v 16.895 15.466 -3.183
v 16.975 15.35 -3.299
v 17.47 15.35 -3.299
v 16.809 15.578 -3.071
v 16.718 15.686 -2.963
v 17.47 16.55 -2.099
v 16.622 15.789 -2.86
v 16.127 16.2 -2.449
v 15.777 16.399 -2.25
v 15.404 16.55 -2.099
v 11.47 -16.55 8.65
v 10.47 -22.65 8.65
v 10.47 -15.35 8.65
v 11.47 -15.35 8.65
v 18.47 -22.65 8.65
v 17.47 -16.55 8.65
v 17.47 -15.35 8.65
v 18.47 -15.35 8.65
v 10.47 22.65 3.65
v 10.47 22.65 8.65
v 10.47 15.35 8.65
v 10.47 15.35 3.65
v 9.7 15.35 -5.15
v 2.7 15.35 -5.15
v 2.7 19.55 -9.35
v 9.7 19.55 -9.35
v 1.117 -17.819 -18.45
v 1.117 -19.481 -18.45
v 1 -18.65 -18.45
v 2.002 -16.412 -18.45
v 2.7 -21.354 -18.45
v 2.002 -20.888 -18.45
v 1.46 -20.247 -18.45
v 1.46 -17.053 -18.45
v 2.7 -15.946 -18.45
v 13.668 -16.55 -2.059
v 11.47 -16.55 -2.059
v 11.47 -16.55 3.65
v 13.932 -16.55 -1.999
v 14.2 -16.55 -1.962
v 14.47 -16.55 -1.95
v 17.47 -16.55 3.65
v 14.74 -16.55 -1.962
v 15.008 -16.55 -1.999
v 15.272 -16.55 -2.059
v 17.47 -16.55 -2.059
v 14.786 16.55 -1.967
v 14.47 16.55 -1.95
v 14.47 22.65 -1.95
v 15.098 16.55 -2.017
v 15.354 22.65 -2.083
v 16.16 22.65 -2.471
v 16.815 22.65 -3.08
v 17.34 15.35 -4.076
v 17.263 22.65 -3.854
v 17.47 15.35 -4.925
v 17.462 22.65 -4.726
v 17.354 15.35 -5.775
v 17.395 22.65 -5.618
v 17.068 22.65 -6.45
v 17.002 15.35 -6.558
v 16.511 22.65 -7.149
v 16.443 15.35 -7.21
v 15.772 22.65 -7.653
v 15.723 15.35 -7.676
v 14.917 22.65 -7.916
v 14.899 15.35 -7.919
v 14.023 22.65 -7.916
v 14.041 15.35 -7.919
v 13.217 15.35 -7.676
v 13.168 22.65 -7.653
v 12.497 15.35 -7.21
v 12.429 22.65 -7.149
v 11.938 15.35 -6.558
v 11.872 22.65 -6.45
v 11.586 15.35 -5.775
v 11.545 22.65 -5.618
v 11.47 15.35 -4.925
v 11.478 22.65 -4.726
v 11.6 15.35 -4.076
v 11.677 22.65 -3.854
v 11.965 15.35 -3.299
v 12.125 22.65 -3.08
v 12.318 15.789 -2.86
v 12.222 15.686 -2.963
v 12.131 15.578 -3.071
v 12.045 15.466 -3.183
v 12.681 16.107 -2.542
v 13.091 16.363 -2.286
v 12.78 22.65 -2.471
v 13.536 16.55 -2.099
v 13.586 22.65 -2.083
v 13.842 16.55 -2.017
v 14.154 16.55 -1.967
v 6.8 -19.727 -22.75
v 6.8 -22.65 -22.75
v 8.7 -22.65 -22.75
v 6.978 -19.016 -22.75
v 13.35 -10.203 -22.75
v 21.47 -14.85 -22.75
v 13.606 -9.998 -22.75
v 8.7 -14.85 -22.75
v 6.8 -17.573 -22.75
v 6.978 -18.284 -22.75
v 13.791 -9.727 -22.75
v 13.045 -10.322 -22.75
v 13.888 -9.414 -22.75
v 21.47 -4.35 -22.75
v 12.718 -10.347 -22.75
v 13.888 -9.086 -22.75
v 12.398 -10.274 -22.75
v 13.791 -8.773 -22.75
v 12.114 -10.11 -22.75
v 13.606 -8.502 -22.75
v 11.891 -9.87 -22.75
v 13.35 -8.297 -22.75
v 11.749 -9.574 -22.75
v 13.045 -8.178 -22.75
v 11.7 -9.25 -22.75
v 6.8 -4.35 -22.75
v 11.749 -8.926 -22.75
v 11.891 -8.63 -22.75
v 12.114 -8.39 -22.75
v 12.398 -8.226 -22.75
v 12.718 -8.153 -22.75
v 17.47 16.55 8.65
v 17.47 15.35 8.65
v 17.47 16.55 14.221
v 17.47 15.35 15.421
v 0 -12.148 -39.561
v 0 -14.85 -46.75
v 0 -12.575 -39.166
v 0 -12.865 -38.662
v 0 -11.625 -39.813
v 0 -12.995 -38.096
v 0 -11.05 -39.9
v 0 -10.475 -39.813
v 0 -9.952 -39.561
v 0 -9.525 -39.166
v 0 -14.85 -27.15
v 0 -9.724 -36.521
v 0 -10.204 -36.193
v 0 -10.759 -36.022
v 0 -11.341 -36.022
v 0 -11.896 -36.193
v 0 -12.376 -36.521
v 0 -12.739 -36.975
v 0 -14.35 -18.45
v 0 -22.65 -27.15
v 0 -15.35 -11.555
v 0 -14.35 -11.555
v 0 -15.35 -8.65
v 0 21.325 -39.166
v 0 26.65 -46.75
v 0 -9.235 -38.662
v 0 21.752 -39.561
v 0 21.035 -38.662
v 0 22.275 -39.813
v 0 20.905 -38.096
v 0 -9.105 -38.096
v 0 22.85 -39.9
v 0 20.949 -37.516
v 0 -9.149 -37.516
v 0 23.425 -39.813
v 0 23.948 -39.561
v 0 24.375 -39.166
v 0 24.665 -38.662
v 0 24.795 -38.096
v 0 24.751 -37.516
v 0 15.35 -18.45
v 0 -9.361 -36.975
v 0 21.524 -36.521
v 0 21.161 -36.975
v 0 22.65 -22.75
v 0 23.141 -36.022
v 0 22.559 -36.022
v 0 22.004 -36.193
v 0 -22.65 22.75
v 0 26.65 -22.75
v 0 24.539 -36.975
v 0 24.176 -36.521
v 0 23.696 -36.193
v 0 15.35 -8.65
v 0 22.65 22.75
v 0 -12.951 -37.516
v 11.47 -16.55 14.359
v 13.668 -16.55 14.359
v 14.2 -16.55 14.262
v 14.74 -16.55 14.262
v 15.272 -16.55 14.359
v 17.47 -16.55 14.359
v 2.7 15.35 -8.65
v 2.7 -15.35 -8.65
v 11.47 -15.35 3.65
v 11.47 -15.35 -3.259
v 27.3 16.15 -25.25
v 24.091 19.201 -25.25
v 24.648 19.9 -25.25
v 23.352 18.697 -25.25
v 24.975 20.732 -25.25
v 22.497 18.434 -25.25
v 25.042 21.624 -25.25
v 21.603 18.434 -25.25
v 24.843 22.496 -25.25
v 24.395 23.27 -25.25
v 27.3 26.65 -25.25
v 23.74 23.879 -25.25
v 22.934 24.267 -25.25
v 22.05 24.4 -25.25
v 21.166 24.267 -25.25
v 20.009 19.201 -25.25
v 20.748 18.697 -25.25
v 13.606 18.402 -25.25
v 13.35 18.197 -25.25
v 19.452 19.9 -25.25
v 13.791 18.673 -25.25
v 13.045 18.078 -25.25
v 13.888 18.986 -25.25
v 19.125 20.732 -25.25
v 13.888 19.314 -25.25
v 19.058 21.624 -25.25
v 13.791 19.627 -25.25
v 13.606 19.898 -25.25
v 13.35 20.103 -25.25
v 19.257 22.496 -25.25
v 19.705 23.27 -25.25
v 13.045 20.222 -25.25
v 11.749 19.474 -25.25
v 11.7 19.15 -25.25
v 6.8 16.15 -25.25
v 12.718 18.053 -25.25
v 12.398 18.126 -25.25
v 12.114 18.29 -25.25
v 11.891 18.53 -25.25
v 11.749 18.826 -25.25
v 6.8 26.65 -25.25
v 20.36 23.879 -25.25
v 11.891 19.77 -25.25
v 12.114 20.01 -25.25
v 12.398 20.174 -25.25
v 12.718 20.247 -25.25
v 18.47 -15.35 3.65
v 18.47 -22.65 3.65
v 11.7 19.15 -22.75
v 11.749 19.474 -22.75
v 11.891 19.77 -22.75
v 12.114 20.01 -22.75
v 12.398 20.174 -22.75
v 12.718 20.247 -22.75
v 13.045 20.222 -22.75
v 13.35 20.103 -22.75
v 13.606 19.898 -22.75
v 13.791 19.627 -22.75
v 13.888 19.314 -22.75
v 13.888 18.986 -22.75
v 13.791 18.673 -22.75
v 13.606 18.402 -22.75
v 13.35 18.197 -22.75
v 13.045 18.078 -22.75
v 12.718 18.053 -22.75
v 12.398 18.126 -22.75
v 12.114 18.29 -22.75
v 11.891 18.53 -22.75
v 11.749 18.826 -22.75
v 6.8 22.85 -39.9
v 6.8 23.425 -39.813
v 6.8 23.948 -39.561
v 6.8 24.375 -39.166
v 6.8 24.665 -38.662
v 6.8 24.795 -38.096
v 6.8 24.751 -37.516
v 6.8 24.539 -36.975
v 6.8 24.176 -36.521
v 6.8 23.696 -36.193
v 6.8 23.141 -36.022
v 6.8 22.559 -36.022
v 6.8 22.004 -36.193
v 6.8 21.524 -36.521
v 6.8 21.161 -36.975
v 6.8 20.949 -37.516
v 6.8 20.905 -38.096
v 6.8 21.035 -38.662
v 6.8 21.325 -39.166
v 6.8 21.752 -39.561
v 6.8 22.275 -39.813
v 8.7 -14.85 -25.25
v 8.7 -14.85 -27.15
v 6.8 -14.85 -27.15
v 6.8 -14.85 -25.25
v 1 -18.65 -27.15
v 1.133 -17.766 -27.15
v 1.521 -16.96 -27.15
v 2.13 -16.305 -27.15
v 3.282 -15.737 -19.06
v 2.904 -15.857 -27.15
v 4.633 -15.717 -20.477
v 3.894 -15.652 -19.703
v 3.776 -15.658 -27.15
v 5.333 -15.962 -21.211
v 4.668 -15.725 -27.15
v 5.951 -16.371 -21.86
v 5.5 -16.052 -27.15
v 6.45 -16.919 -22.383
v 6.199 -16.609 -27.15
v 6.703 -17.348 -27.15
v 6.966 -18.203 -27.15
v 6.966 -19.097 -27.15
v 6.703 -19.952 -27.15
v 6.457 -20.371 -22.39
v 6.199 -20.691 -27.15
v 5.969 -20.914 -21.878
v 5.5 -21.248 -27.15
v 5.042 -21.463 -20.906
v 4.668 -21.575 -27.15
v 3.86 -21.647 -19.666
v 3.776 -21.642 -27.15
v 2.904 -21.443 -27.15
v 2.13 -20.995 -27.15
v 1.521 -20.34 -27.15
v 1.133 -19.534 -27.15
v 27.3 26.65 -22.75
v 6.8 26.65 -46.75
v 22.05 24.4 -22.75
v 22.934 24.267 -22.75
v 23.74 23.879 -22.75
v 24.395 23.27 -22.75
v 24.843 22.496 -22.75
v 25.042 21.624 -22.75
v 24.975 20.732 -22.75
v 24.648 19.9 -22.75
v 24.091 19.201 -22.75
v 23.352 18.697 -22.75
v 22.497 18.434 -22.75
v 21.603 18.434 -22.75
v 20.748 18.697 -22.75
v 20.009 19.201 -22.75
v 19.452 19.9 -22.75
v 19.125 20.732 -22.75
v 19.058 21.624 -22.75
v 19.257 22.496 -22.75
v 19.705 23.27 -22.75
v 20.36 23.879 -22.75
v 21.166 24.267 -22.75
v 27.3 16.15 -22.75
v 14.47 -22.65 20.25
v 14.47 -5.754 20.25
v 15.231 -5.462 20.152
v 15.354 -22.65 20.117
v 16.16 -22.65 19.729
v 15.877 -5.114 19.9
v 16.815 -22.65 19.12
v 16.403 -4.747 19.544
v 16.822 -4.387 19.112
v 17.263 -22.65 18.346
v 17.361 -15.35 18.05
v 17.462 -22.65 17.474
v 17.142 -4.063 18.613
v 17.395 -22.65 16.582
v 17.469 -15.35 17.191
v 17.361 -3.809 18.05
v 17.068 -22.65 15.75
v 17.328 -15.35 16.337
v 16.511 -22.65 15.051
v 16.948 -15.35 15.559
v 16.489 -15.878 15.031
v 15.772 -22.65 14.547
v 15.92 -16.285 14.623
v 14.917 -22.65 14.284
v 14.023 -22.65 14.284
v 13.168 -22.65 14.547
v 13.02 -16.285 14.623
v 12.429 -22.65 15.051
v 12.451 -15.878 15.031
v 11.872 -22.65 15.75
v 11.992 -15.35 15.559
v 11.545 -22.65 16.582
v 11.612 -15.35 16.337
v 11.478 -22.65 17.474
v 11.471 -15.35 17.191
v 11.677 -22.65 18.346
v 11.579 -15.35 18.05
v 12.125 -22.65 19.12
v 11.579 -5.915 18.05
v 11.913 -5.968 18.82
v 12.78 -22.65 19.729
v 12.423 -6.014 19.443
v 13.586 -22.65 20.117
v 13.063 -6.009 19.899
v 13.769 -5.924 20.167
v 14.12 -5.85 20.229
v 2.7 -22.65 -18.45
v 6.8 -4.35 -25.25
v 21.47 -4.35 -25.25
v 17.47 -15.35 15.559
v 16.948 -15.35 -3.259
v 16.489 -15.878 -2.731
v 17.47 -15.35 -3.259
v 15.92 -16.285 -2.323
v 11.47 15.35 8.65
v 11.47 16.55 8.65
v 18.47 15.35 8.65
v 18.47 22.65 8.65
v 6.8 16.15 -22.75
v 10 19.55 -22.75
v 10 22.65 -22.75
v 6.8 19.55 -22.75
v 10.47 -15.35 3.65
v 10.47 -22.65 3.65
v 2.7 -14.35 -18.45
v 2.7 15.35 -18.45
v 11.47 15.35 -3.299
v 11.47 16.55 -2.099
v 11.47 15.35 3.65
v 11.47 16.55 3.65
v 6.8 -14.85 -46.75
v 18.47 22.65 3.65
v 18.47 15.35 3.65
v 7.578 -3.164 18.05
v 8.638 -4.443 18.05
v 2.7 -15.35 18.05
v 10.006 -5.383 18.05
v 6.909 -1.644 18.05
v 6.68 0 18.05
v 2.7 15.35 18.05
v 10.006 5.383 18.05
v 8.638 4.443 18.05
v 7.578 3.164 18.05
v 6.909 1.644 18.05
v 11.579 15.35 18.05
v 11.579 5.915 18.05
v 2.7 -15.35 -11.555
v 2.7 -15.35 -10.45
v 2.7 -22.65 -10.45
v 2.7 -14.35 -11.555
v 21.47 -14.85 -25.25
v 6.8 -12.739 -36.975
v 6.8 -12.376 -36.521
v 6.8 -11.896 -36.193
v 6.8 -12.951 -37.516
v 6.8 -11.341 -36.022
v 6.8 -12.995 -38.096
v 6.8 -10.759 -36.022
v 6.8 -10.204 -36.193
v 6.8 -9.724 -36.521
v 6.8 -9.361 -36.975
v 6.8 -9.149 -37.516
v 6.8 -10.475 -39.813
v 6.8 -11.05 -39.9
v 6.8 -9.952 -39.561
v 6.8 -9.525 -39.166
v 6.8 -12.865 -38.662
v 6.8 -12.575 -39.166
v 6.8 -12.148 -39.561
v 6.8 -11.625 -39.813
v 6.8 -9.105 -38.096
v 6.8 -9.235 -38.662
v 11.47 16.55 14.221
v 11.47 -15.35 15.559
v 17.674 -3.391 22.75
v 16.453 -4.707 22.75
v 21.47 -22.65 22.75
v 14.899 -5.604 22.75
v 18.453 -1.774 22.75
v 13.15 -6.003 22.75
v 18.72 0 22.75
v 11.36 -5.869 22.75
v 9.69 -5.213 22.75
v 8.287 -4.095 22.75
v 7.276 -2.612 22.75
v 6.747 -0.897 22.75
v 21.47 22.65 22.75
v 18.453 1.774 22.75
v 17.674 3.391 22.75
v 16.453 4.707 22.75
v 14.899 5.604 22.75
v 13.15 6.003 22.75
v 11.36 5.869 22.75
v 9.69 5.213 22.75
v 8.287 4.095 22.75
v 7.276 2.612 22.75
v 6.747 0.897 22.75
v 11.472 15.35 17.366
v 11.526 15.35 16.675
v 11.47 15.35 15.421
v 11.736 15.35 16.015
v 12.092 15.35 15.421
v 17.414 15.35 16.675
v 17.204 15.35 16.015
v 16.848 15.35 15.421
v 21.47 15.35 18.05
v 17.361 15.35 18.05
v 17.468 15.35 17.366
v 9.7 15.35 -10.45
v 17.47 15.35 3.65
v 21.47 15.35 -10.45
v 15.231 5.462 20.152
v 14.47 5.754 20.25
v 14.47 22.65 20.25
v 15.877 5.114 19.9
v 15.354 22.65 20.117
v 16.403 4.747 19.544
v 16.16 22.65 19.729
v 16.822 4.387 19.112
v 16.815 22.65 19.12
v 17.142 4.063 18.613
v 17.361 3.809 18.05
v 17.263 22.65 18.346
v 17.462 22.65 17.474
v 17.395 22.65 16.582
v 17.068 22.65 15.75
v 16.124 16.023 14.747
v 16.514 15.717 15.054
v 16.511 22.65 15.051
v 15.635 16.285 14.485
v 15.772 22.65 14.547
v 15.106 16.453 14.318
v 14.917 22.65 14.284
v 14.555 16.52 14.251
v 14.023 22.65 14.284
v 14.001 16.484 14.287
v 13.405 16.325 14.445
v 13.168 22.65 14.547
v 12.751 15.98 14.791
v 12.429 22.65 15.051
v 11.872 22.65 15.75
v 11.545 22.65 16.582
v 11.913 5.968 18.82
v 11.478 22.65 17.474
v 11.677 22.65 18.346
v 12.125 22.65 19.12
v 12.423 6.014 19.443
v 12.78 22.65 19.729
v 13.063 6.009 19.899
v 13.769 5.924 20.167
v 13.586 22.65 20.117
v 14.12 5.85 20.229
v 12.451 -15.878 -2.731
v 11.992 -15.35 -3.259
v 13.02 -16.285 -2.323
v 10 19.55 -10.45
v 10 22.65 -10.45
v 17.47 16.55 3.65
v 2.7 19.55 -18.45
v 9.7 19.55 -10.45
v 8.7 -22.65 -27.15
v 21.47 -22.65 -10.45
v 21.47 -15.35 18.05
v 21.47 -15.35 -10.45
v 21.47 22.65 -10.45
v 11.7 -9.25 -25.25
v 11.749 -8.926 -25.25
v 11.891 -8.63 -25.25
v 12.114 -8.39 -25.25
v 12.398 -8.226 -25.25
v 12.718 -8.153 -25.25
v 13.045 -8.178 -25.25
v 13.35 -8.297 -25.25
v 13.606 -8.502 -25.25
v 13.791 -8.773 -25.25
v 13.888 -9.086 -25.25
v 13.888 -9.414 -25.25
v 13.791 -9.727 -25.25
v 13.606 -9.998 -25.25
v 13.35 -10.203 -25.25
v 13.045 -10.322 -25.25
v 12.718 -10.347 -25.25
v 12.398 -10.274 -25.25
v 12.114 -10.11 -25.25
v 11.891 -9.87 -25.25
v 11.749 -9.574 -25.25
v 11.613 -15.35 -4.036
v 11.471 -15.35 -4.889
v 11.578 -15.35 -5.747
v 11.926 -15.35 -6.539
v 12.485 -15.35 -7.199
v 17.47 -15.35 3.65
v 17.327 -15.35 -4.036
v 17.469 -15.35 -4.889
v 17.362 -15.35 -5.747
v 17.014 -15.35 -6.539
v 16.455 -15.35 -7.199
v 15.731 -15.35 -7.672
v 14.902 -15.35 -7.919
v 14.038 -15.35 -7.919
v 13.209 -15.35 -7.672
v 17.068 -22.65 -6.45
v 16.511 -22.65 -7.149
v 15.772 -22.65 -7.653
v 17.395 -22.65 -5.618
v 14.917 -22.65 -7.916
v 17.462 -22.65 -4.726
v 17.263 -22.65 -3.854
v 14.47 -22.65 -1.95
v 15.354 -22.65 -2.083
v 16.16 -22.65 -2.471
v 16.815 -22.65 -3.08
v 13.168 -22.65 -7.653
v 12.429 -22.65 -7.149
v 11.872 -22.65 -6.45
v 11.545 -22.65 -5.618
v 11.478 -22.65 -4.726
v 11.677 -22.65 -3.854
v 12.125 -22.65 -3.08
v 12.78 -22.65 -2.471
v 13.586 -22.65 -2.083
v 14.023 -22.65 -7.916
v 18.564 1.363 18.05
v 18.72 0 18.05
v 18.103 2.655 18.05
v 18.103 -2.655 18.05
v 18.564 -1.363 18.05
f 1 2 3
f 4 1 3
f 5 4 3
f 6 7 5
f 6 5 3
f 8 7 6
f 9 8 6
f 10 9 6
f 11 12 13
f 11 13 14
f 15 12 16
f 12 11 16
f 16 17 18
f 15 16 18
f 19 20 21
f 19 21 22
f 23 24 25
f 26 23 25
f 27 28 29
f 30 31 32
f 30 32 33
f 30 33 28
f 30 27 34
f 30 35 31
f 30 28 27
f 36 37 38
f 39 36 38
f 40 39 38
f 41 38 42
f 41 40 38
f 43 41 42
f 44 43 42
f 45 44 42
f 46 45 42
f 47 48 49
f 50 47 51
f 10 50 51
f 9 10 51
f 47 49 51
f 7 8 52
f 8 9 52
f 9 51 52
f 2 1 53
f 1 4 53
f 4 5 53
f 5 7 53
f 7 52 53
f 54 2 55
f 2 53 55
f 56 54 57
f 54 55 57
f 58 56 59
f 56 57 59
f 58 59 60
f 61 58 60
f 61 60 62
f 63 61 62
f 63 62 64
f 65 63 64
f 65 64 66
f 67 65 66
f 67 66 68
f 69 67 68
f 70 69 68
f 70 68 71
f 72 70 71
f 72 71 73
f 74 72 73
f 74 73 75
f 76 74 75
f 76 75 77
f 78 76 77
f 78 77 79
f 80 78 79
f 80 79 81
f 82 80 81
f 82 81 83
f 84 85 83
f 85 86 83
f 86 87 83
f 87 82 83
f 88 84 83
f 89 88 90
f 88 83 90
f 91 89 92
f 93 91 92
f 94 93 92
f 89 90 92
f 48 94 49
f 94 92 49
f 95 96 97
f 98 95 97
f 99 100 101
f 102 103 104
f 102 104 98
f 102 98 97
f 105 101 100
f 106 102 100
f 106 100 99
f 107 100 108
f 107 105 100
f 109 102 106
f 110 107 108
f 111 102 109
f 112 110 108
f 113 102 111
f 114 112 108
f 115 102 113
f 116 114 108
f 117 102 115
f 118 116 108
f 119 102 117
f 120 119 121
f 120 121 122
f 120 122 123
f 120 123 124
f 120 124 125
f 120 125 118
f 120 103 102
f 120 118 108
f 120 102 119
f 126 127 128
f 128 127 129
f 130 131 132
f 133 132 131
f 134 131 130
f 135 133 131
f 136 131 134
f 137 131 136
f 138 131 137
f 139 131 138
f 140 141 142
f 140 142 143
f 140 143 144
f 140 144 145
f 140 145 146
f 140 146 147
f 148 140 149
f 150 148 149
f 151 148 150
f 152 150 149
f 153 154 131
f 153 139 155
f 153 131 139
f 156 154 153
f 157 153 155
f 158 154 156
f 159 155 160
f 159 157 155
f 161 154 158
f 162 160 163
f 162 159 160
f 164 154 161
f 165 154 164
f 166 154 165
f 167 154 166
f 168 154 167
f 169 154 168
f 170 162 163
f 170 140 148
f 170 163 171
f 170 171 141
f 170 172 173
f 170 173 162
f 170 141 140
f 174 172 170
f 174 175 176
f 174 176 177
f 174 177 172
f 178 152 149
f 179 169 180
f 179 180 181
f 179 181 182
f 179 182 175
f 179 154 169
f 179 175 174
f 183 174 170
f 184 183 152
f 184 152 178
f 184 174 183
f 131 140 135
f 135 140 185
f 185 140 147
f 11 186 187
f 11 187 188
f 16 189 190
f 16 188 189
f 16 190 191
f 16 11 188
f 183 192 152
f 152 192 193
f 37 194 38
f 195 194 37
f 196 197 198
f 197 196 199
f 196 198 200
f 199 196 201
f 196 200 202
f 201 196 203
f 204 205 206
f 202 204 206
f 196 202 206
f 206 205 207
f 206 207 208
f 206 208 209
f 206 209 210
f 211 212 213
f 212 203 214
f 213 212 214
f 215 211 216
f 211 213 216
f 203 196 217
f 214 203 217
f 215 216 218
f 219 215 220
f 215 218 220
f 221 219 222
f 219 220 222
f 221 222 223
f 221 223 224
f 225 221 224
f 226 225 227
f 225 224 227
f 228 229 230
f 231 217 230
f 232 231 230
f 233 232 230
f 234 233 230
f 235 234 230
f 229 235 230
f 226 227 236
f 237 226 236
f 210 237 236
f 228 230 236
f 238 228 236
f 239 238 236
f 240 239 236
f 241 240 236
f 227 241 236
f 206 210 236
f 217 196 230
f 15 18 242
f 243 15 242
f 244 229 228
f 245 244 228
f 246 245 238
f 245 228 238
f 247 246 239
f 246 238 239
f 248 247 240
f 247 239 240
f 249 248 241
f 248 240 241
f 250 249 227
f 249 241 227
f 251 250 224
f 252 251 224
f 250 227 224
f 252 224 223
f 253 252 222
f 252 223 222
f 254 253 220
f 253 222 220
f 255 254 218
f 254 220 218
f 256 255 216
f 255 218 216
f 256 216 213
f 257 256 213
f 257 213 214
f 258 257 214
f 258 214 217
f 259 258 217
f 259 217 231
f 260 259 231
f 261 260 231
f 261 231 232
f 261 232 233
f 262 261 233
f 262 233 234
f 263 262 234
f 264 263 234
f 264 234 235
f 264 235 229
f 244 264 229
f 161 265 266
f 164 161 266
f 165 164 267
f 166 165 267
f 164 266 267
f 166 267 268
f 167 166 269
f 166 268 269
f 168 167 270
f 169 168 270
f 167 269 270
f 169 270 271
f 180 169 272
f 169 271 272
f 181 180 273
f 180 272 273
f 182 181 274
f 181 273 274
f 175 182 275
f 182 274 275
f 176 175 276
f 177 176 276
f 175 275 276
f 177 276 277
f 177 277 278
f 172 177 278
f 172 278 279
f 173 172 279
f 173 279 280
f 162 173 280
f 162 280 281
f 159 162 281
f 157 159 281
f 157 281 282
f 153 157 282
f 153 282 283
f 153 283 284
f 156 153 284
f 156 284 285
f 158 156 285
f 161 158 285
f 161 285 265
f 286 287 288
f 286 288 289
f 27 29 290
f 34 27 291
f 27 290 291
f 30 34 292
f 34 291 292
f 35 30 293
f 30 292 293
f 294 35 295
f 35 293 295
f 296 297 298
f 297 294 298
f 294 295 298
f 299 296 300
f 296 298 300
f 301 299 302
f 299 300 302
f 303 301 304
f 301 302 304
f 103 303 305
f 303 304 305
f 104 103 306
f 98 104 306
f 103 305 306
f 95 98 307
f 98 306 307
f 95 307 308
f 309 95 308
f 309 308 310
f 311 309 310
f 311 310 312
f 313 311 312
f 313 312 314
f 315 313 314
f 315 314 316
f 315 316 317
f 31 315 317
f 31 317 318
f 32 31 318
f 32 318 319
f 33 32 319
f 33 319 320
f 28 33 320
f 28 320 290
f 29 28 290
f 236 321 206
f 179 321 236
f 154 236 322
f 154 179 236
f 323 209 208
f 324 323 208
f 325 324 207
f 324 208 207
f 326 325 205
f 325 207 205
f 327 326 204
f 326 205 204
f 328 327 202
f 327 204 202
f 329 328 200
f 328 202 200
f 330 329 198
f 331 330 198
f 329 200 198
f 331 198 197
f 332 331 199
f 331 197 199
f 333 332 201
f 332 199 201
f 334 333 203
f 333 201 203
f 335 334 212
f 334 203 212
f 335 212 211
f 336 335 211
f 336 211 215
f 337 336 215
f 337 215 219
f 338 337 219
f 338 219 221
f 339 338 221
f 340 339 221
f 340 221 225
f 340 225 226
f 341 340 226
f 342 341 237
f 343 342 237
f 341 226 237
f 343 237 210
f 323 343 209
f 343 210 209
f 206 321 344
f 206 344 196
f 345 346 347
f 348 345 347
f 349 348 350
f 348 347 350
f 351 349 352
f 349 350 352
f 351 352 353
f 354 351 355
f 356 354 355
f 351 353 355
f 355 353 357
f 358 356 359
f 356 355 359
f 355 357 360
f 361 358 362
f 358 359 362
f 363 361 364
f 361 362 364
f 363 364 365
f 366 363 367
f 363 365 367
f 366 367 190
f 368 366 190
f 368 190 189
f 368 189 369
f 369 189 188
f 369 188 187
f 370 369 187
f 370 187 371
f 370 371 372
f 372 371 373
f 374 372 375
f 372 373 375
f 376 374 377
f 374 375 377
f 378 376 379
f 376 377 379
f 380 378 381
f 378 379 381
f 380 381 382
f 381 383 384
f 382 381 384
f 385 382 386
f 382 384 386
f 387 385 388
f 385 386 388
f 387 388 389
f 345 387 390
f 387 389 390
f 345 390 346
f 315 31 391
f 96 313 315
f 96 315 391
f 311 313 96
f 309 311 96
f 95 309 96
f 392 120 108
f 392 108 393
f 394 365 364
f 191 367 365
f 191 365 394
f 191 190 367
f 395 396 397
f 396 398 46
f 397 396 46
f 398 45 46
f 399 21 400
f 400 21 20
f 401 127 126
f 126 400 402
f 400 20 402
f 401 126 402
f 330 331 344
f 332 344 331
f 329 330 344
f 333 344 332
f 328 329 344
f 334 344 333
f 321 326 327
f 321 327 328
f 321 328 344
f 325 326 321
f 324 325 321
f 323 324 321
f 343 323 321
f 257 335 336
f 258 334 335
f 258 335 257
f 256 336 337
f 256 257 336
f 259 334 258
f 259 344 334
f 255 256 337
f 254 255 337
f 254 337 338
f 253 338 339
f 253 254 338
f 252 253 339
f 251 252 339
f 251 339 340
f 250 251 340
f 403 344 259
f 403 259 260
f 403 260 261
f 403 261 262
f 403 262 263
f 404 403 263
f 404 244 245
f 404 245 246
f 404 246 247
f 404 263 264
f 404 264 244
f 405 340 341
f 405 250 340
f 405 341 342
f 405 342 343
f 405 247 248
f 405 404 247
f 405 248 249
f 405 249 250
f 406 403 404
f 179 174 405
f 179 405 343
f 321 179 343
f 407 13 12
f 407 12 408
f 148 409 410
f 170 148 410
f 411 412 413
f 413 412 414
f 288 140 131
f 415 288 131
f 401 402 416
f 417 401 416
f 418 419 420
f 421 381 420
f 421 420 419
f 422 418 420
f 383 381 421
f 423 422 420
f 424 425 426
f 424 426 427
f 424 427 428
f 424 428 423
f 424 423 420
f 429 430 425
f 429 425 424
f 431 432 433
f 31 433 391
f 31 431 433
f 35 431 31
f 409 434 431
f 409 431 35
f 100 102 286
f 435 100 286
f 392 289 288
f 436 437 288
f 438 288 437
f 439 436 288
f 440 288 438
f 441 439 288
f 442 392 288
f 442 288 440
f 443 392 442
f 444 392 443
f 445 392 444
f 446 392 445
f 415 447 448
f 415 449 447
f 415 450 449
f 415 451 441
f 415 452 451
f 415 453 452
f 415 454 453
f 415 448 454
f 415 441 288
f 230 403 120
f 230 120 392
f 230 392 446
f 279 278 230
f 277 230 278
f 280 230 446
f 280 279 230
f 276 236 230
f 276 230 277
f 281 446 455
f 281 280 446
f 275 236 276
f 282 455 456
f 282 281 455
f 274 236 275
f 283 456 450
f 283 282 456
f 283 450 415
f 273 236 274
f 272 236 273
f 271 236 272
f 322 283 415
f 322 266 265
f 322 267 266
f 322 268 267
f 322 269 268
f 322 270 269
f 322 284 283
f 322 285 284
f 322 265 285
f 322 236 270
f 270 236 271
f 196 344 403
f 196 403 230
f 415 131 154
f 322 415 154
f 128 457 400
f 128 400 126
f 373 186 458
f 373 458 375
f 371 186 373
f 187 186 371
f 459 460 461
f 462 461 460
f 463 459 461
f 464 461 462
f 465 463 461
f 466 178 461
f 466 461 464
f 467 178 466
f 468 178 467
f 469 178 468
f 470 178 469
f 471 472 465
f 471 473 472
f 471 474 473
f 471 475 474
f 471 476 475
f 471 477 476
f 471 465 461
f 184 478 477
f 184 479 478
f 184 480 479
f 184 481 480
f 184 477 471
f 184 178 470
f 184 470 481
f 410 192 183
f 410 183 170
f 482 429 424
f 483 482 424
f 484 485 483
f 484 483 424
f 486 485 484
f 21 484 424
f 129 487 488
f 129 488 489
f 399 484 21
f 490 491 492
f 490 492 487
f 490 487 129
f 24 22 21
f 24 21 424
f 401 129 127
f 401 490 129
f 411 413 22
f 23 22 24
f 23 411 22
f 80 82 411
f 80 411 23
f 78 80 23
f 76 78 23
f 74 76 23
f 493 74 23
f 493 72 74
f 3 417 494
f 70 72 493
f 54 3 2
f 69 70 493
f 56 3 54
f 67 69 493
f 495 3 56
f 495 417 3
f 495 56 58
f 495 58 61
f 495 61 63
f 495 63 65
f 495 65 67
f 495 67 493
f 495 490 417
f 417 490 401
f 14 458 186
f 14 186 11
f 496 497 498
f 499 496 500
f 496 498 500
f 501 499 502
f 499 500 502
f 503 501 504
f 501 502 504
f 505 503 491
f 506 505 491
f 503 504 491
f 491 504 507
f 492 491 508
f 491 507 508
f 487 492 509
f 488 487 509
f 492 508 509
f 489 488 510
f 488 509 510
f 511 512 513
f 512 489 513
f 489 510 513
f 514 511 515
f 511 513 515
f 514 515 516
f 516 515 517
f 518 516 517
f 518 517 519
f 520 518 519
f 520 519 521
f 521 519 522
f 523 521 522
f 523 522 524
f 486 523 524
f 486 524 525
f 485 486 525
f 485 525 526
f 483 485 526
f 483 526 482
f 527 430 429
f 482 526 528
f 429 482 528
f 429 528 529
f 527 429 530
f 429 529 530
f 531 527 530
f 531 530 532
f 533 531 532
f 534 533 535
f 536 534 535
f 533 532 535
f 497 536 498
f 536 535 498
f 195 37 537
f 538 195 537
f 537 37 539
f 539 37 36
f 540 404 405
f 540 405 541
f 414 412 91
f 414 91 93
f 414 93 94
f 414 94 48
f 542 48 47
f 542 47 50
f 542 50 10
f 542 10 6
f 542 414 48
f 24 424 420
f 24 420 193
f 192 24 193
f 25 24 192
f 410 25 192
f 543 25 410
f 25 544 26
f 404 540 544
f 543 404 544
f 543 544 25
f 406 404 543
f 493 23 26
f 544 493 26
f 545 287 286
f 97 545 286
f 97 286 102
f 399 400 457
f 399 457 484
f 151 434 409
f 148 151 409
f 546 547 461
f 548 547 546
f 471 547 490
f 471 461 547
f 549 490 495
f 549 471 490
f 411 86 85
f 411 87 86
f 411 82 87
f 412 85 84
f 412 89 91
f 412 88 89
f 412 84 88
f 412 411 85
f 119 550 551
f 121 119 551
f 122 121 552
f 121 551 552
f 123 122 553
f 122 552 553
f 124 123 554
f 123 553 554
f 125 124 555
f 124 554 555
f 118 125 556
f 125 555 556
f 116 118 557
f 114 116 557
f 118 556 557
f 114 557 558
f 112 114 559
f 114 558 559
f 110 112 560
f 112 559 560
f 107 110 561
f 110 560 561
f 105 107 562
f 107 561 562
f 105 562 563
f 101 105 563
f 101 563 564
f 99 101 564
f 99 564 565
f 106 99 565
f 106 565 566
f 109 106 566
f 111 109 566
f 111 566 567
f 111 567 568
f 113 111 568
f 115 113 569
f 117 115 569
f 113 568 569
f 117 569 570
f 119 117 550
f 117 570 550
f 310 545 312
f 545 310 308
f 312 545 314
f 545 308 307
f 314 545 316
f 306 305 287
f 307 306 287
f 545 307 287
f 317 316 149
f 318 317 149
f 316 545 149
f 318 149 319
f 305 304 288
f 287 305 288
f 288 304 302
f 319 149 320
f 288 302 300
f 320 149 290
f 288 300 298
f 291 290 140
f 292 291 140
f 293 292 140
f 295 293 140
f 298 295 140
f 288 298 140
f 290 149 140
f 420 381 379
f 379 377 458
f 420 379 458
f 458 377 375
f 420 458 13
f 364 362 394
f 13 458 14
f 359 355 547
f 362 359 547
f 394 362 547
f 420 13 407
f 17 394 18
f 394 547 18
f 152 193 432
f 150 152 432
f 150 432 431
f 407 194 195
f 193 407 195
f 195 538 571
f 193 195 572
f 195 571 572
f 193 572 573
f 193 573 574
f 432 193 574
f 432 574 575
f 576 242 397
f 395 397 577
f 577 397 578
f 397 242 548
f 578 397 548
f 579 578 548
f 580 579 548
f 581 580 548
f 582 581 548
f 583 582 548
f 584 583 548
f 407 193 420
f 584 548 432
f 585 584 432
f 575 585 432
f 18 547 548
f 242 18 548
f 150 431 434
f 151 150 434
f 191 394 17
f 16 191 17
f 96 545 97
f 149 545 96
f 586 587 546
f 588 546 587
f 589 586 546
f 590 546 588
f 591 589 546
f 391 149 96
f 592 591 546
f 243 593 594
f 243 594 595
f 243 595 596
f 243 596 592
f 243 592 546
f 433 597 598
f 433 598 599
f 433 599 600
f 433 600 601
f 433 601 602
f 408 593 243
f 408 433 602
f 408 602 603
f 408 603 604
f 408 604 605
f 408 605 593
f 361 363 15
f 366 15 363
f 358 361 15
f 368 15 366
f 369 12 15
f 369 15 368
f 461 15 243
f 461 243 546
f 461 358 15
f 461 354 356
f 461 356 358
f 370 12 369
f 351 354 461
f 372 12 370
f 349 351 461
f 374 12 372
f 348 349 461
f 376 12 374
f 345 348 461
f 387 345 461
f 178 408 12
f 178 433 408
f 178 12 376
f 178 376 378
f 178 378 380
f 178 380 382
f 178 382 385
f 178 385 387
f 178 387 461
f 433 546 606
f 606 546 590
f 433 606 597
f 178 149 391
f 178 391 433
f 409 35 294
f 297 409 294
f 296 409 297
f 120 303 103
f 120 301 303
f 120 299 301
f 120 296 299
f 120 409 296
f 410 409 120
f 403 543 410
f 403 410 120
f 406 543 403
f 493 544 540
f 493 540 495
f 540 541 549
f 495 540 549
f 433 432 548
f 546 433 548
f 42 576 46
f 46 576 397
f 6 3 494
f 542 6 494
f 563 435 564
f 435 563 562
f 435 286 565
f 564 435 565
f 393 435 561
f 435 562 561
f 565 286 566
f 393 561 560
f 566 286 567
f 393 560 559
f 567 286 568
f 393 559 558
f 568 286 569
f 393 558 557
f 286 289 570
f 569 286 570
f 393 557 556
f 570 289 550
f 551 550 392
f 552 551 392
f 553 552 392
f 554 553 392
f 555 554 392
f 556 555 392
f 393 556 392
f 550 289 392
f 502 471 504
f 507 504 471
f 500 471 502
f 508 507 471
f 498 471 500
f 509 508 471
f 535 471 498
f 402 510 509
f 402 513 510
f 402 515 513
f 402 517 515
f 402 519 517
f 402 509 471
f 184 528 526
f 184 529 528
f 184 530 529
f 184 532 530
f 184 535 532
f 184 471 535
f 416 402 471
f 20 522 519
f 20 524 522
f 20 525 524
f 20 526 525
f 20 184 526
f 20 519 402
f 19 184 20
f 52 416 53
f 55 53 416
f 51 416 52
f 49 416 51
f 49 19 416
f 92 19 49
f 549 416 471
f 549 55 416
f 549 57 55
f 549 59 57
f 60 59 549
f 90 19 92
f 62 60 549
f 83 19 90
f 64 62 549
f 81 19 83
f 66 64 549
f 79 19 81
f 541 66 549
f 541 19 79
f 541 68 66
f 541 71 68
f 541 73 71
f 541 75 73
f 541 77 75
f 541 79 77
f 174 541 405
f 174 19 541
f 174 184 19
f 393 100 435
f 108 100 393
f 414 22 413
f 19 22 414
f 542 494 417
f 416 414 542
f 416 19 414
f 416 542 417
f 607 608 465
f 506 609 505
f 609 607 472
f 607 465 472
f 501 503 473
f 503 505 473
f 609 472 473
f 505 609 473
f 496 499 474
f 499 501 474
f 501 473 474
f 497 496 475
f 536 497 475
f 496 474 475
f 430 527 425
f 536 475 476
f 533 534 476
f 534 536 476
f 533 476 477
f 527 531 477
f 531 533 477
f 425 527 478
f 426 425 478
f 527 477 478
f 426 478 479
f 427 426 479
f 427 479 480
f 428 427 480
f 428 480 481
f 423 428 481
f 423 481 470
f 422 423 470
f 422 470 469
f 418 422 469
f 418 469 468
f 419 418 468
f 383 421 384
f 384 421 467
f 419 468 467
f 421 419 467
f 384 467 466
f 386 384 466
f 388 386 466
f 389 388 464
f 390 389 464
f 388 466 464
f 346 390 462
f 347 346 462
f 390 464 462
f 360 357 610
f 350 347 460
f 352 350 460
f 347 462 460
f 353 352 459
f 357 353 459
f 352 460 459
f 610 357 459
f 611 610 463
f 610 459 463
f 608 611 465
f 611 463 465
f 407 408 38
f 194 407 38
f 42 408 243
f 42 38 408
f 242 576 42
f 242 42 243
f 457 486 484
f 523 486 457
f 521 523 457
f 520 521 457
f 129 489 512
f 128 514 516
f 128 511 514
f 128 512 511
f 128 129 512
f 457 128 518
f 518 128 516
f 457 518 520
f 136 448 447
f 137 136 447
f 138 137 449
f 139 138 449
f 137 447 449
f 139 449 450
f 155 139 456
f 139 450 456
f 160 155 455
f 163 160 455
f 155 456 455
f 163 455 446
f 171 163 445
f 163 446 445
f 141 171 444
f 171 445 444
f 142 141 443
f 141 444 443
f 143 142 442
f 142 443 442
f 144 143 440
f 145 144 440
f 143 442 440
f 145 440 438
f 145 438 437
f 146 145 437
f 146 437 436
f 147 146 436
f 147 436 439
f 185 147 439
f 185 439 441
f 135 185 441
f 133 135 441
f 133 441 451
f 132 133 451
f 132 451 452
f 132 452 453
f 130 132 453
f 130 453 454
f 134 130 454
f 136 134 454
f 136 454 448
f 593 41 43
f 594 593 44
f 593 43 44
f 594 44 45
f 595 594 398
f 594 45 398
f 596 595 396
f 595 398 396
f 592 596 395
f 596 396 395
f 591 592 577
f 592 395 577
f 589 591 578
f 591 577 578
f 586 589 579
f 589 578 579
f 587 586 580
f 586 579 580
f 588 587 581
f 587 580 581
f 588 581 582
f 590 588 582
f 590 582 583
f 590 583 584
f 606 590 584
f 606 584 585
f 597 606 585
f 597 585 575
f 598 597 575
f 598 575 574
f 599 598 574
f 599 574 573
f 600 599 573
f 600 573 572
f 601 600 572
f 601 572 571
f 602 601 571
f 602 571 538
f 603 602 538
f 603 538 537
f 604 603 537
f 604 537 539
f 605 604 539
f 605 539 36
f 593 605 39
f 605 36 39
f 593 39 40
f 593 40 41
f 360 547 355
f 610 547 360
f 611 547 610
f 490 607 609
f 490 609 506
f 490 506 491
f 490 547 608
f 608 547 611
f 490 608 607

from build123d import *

# Parameters (mm, degrees)
CROQUIS4_W              = 45.5
CROQUIS4_H              = 45.3
SALIENTE_EXTRUIR3_DEPTH = 21.47
CROQUIS5_W              = 41.141731218
CROQUIS5_H              = 30.7
CORTAR_EXTRUIR2_DEPTH   = 18.77
CROQUIS6_W              = 18.6
CROQUIS6_H              = 24.6
CORTAR_EXTRUIR3_DEPTH   = 18.77
CROQUIS7_R              = 3
CORTAR_EXTRUIR4_DEPTH   = 58.77
CROQUIS8_R              = 6.02
CORTAR_EXTRUIR5_DEPTH   = 58.77
CROQUIS9_W              = 6
CROQUIS9_H              = 16.319841708
CORTAR_EXTRUIR7_DEPTH   = 1.2
CHAFL_N1_SIZE           = 1.2
CROQUIS10_W             = 8
CROQUIS10_H             = 5
CORTAR_EXTRUIR8_DEPTH   = 71.2
CROQUIS11_W             = 6
CROQUIS11_H             = 16.418152186
CORTAR_EXTRUIR9_DEPTH   = 1.2
CHAFL_N2_SIZE           = 1.2
CORTAR_EXTRUIR12_DEPTH  = 11.2
CORTAR_EXTRUIR14_DEPTH  = 7
CROQUIS15_W             = 12.3
CROQUIS15_H             = 4.2
CORTAR_EXTRUIR15_DEPTH  = 9.47
CROQUIS16_W             = 7
CROQUIS16_H             = 5
CORTAR_EXTRUIR17_DEPTH  = 0.3
CROQUIS17_W             = 7
CROQUIS17_H             = 0.8
SALIENTE_EXTRUIR4_DEPTH = 3
CROQUIS18_W             = 21.819351721
CROQUIS18_H             = 12.3
CORTAR_EXTRUIR18_DEPTH  = 53
SALIENTE_EXTRUIR5_START = -2.7
CROQUIS19_W             = 24
CROQUIS19_H             = 41.5
SALIENTE_EXTRUIR5_DEPTH = 6.8
CROQUIS21_W             = 2.5
CROQUIS21_H             = 10.5
SALIENTE_EXTRUIR6_DEPTH = 20.5
CROQUIS22_R             = 1.95
CORTAR_EXTRUIR19_DEPTH  = 20.5
CROQUIS23_W             = 9.795322327
CROQUIS23_H             = 20.802243728
CORTAR_EXTRUIR20_DEPTH  = 20.5
CROQUIS24_R             = 1.1
CORTAR_EXTRUIR22_DEPTH  = 2.5
CROQUIS25_W             = 2.17
CROQUIS25_H             = 12.3
CORTAR_EXTRUIR23_DEPTH  = 13
CROQUIS26_R             = 3
CORTAR_EXTRUIR24_DEPTH  = 2.5
SALIENTE_EXTRUIR7_REACH = 70.642
CROQUIS31_W             = 4.4
CROQUIS31_H             = 7.8
SALIENTE_EXTRUIR8_DEPTH = 8.7
CROQUIS32_R             = 3
CORTAR_EXTRUIR25_DEPTH  = 8.7


# Some blends are built 0.0001 mm under size
with BuildPart() as part:
    # Croquis4 → Saliente-Extruir3 (new body)
    with BuildSketch(Plane(origin=(0, 0, 0), x_dir=(0, 0, -1), z_dir=(1, 0, 0))):
        Rectangle(CROQUIS4_W, CROQUIS4_H)
    extrude(amount=SALIENTE_EXTRUIR3_DEPTH)

    # Croquis5 → Cortar-Extruir2 (cut)
    with BuildSketch(Plane(origin=(21.47, 0, 0), x_dir=(0, 0, -1), z_dir=(1, 0, 0))):
        with Locations((2.520865609, 0)):
            Rectangle(CROQUIS5_W, CROQUIS5_H)
    extrude(amount=-CORTAR_EXTRUIR2_DEPTH, mode=Mode.SUBTRACT)

    # Croquis6 → Cortar-Extruir3 (cut)
    with BuildSketch(Plane(origin=(0, 22.65, 0), x_dir=(1, 0, 0), z_dir=(0, 1, 0))):
        with Locations((21.47, 22.75)):
            Rectangle(CROQUIS6_W, CROQUIS6_H)
    extrude(amount=-CORTAR_EXTRUIR3_DEPTH, mode=Mode.SUBTRACT)

    # Croquis7 → Cortar-Extruir4 (cut)
    with BuildSketch(Plane(origin=(0, 22.65, 0), x_dir=(1, 0, 0), z_dir=(0, 1, 0))):
        with Locations(Location((14.47, -17.25, 0), (0, 0, 270))):
            Circle(CROQUIS7_R)
        with Locations(Location((14.47, 4.95, 0), (0, 0, 270))):
            Circle(CROQUIS7_R)
    extrude(amount=-CORTAR_EXTRUIR4_DEPTH, mode=Mode.SUBTRACT)

    # Croquis8 → Cortar-Extruir5 (cut)
    with BuildSketch(Plane.XY.offset(22.75)):
        with Locations((12.7, 0)):
            Circle(CROQUIS8_R)
    extrude(amount=-CORTAR_EXTRUIR5_DEPTH, mode=Mode.SUBTRACT)

    # Croquis9 → Cortar-Extruir7 (cut)
    with BuildSketch(Plane.XZ.offset(-15.35)):
        with Locations((14.47, 6.060847086)):
            Rectangle(CROQUIS9_W, CROQUIS9_H)
    extrude(amount=-CORTAR_EXTRUIR7_DEPTH, mode=Mode.SUBTRACT)

    # Chaflán1
    # the kernel refuses this chamfer: 1.2 mm, written as the material it takes off along each edge
    with BuildSketch(Plane(origin=(12.317907402, 15.35, -2.099073768), x_dir=(0, -0.027495876610584495, -0.9996219169112968), z_dir=(1, 0, 0)), Plane(origin=(11.47, 15.35, -2.099073768), x_dir=(0, -0.027495876610584533, -0.9996219169112968), z_dir=(1, 0, 0))) as chafl_n1_piece_1:
        Polygon((CHAFL_N1_SIZE * 0.999621916911, CHAFL_N1_SIZE * 0.0274958766106), (-CHAFL_N1_SIZE * 0.0274958766106, CHAFL_N1_SIZE * 0.999621916911), (0, 0), align=None)
    extrude(amount=5.152092598, mode=Mode.SUBTRACT)
    with BuildSketch(Plane(origin=(17.47, 15.35, 14.22076794), x_dir=(0, -0.027495876610585984, 0.9996219169112968), z_dir=(-1, 0, 0))) as chafl_n1_piece_2_section:
        Polygon((CHAFL_N1_SIZE * 0.999621916911, CHAFL_N1_SIZE * 0.0274958766106), (-CHAFL_N1_SIZE * 0.0274958766106, CHAFL_N1_SIZE * 0.999621916911), (0, 0), align=None)
    chafl_n1_piece_2 = extrude(amount=6, mode=Mode.PRIVATE)
    chafl_n1_piece_2 = split(chafl_n1_piece_2, bisect_by=Plane(origin=(14.47, 16.55, 14.617252925), z_dir=(0, -1, 0)), keep=Keep.TOP, mode=Mode.PRIVATE)
    add(chafl_n1_piece_2, mode=Mode.SUBTRACT)

    # Croquis10 → Cortar-Extruir8 (cut)
    with BuildSketch(Plane(origin=(0, 22.65, 0), x_dir=(1, 0, 0), z_dir=(0, 1, 0))):
        with Locations((14.47, -6.15)):
            Rectangle(CROQUIS10_W, CROQUIS10_H)
    extrude(amount=-CORTAR_EXTRUIR8_DEPTH, mode=Mode.SUBTRACT)

    # Croquis11 → Cortar-Extruir9 (cut)
    with BuildSketch(Plane(origin=(0, -15.35, 0), x_dir=(1, 0, 0), z_dir=(0, 1, 0))):
        with Locations((14.47, -6.15)):
            Rectangle(CROQUIS11_W, CROQUIS11_H)
    extrude(amount=-CORTAR_EXTRUIR9_DEPTH, mode=Mode.SUBTRACT)

    # Chaflán2
    chafl_n2_edges = [part.edges().sort_by_distance(p)[0] for p in [
        (12.569201122, -15.35, -2.059076093),
        (16.370798878, -15.35, -2.059076093),
        (12.569201122, -15.35, 14.359076093),
        (16.370798878, -15.35, 14.359076093),
    ]]
    chamfer(chafl_n2_edges, length=CHAFL_N2_SIZE - 0.0001)  # a hair under: the kernel refuses the full size

    # Croquis12 → Cortar-Extruir12 (cut)
    with BuildSketch(Plane(origin=(2.7, 0, 0), x_dir=(0, 0, -1), z_dir=(1, 0, 0))):
        Polygon((8.65, 15.35), (8.65, -15.35), (11.55469898, -15.35), (11.55469898, -14.35), (18.45, -14.35), (18.45, 15.35), align=None)
    extrude(amount=-CORTAR_EXTRUIR12_DEPTH, mode=Mode.SUBTRACT)

    # Croquis14 → Cortar-Extruir14 (cut)
    with BuildSketch(Plane(origin=(2.7, 0, 0), x_dir=(0, 0, -1), z_dir=(1, 0, 0))):
        Polygon((10.15, 15.35), (5.15, 15.35), (10.15, 20.35), align=None)
    extrude(amount=CORTAR_EXTRUIR14_DEPTH, mode=Mode.SUBTRACT)

    # Croquis15 → Cortar-Extruir15 (cut)
    with BuildSketch(Plane(origin=(12.17, 0, 0), x_dir=(0, 0, -1), z_dir=(1, 0, 0))):
        with Locations((16.6, 17.45)):
            Rectangle(CROQUIS15_W, CROQUIS15_H)
    extrude(amount=-CORTAR_EXTRUIR15_DEPTH, mode=Mode.SUBTRACT)

    # Croquis16 → Cortar-Extruir17 (cut)
    with BuildSketch(Plane.XY.offset(-10.15)):
        with Locations((6.2, 17.85)):
            Rectangle(CROQUIS16_W, CROQUIS16_H)
    extrude(amount=-CORTAR_EXTRUIR17_DEPTH, mode=Mode.SUBTRACT)

    # Croquis17 → Saliente-Extruir4 (add)
    with BuildSketch(Plane(origin=(0, 0, -10.45), x_dir=(-1, 0, 0), z_dir=(0, 0, -1))):
        with Locations((-6.2, 19.95)):
            Rectangle(CROQUIS17_W, CROQUIS17_H)
    extrude(amount=-SALIENTE_EXTRUIR4_DEPTH)

    # Croquis18 → Cortar-Extruir18 (cut)
    with BuildSketch(Plane.XZ.offset(-19.55)):
        with Locations((13.609675861, -16.6)):
            Rectangle(CROQUIS18_W, CROQUIS18_H)
    extrude(amount=CORTAR_EXTRUIR18_DEPTH, mode=Mode.SUBTRACT)

    # Croquis19 → Saliente-Extruir5 (add)
    with BuildSketch(Plane(origin=(2.7, 0, 0), x_dir=(0, 0, -1), z_dir=(1, 0, 0)).offset(SALIENTE_EXTRUIR5_START)):
        with Locations((34.75, 5.9)):
            Rectangle(CROQUIS19_W, CROQUIS19_H)
    extrude(amount=SALIENTE_EXTRUIR5_DEPTH)

    # Croquis21 → Saliente-Extruir6 (add)
    with BuildSketch(Plane(origin=(6.8, 0, 0), x_dir=(0, 0, -1), z_dir=(1, 0, 0))):
        with Locations((24, 21.4)):
            Rectangle(CROQUIS21_W, CROQUIS21_H)
        with Locations((24, -9.6)):
            Rectangle(CROQUIS21_W, CROQUIS21_H)
    extrude(amount=SALIENTE_EXTRUIR6_DEPTH)

    # Croquis22 → Cortar-Extruir19 (cut)
    with BuildSketch(Plane(origin=(6.8, 0, 0), x_dir=(0, 0, -1), z_dir=(1, 0, 0))):
        with Locations((37.95, 22.85)):
            Circle(CROQUIS22_R)
        with Locations((37.95, -11.05)):
            Circle(CROQUIS22_R)
    extrude(amount=-CORTAR_EXTRUIR19_DEPTH, mode=Mode.SUBTRACT)

    # Croquis23 → Cortar-Extruir20 (cut)
    with BuildSketch(Plane(origin=(0, 0, -10.45), x_dir=(-1, 0, 0), z_dir=(0, 0, -1))):
        with Locations((-26.367661164, -11.870604275)):
            Rectangle(CROQUIS23_W, CROQUIS23_H)
    extrude(amount=CORTAR_EXTRUIR20_DEPTH, mode=Mode.SUBTRACT)

    # Croquis24 → Cortar-Extruir22 (cut)
    with BuildSketch(Plane(origin=(0, 0, -25.25), x_dir=(-1, 0, 0), z_dir=(0, 0, -1))):
        with Locations((-12.8, -9.25)):
            Circle(CROQUIS24_R)
        with Locations((-12.8, 19.15)):
            Circle(CROQUIS24_R)
    extrude(amount=-CORTAR_EXTRUIR22_DEPTH, mode=Mode.SUBTRACT)

    # Croquis25 → Cortar-Extruir23 (cut)
    with BuildSketch(Plane.XZ.offset(-19.55)):
        with Locations((11.085, -16.6)):
            Rectangle(CROQUIS25_W, CROQUIS25_H)
    extrude(amount=-CORTAR_EXTRUIR23_DEPTH, mode=Mode.SUBTRACT)

    # Croquis26 → Cortar-Extruir24 (cut)
    with BuildSketch(Plane(origin=(0, 0, -25.25), x_dir=(-1, 0, 0), z_dir=(0, 0, -1))):
        with Locations(Location((-22.05, 21.4, 0), (0, 0, 90))):
            Circle(CROQUIS26_R)
    extrude(amount=-CORTAR_EXTRUIR24_DEPTH, mode=Mode.SUBTRACT)

    # Saliente-Extruir7: up to this face of the body (flat: up to its plane)
    saliente_extruir7_end = Plane(part.part.faces().sort_by_distance((9.699863726, -22.65, 4.986693104))[0])
    # Croquis30 → Saliente-Extruir7 (add, up to the picked face)
    with BuildSketch(Plane.XZ.offset(-19.55), mode=Mode.PRIVATE) as saliente_extruir7_sk1:
        Polygon((2.7, -18.45), (6.8, -22.75), (2.7, -22.75), align=None)
    saliente_extruir7_tool1 = split(extrude(saliente_extruir7_sk1.sketch, amount=SALIENTE_EXTRUIR7_REACH, mode=Mode.PRIVATE), bisect_by=saliente_extruir7_end, keep=Keep.BOTH, mode=Mode.PRIVATE)
    add(saliente_extruir7_tool1.solids().sort_by(Axis((4.066667, 19.55, -21.316667), (0, -1, 0)))[0])

    # Croquis31 → Saliente-Extruir8 (add)
    with BuildSketch(Plane.ZY):
        with Locations((-24.95, -18.75)):
            Rectangle(CROQUIS31_W, CROQUIS31_H)
    extrude(amount=-SALIENTE_EXTRUIR8_DEPTH)

    # Croquis32 → Cortar-Extruir25 (cut)
    with BuildSketch(Plane(origin=(0, 0, -27.15), x_dir=(-1, 0, 0), z_dir=(0, 0, -1))):
        with Locations((-4, -18.65)):
            Circle(CROQUIS32_R)
    extrude(amount=-CORTAR_EXTRUIR25_DEPTH, mode=Mode.SUBTRACT)


solid = part.part
